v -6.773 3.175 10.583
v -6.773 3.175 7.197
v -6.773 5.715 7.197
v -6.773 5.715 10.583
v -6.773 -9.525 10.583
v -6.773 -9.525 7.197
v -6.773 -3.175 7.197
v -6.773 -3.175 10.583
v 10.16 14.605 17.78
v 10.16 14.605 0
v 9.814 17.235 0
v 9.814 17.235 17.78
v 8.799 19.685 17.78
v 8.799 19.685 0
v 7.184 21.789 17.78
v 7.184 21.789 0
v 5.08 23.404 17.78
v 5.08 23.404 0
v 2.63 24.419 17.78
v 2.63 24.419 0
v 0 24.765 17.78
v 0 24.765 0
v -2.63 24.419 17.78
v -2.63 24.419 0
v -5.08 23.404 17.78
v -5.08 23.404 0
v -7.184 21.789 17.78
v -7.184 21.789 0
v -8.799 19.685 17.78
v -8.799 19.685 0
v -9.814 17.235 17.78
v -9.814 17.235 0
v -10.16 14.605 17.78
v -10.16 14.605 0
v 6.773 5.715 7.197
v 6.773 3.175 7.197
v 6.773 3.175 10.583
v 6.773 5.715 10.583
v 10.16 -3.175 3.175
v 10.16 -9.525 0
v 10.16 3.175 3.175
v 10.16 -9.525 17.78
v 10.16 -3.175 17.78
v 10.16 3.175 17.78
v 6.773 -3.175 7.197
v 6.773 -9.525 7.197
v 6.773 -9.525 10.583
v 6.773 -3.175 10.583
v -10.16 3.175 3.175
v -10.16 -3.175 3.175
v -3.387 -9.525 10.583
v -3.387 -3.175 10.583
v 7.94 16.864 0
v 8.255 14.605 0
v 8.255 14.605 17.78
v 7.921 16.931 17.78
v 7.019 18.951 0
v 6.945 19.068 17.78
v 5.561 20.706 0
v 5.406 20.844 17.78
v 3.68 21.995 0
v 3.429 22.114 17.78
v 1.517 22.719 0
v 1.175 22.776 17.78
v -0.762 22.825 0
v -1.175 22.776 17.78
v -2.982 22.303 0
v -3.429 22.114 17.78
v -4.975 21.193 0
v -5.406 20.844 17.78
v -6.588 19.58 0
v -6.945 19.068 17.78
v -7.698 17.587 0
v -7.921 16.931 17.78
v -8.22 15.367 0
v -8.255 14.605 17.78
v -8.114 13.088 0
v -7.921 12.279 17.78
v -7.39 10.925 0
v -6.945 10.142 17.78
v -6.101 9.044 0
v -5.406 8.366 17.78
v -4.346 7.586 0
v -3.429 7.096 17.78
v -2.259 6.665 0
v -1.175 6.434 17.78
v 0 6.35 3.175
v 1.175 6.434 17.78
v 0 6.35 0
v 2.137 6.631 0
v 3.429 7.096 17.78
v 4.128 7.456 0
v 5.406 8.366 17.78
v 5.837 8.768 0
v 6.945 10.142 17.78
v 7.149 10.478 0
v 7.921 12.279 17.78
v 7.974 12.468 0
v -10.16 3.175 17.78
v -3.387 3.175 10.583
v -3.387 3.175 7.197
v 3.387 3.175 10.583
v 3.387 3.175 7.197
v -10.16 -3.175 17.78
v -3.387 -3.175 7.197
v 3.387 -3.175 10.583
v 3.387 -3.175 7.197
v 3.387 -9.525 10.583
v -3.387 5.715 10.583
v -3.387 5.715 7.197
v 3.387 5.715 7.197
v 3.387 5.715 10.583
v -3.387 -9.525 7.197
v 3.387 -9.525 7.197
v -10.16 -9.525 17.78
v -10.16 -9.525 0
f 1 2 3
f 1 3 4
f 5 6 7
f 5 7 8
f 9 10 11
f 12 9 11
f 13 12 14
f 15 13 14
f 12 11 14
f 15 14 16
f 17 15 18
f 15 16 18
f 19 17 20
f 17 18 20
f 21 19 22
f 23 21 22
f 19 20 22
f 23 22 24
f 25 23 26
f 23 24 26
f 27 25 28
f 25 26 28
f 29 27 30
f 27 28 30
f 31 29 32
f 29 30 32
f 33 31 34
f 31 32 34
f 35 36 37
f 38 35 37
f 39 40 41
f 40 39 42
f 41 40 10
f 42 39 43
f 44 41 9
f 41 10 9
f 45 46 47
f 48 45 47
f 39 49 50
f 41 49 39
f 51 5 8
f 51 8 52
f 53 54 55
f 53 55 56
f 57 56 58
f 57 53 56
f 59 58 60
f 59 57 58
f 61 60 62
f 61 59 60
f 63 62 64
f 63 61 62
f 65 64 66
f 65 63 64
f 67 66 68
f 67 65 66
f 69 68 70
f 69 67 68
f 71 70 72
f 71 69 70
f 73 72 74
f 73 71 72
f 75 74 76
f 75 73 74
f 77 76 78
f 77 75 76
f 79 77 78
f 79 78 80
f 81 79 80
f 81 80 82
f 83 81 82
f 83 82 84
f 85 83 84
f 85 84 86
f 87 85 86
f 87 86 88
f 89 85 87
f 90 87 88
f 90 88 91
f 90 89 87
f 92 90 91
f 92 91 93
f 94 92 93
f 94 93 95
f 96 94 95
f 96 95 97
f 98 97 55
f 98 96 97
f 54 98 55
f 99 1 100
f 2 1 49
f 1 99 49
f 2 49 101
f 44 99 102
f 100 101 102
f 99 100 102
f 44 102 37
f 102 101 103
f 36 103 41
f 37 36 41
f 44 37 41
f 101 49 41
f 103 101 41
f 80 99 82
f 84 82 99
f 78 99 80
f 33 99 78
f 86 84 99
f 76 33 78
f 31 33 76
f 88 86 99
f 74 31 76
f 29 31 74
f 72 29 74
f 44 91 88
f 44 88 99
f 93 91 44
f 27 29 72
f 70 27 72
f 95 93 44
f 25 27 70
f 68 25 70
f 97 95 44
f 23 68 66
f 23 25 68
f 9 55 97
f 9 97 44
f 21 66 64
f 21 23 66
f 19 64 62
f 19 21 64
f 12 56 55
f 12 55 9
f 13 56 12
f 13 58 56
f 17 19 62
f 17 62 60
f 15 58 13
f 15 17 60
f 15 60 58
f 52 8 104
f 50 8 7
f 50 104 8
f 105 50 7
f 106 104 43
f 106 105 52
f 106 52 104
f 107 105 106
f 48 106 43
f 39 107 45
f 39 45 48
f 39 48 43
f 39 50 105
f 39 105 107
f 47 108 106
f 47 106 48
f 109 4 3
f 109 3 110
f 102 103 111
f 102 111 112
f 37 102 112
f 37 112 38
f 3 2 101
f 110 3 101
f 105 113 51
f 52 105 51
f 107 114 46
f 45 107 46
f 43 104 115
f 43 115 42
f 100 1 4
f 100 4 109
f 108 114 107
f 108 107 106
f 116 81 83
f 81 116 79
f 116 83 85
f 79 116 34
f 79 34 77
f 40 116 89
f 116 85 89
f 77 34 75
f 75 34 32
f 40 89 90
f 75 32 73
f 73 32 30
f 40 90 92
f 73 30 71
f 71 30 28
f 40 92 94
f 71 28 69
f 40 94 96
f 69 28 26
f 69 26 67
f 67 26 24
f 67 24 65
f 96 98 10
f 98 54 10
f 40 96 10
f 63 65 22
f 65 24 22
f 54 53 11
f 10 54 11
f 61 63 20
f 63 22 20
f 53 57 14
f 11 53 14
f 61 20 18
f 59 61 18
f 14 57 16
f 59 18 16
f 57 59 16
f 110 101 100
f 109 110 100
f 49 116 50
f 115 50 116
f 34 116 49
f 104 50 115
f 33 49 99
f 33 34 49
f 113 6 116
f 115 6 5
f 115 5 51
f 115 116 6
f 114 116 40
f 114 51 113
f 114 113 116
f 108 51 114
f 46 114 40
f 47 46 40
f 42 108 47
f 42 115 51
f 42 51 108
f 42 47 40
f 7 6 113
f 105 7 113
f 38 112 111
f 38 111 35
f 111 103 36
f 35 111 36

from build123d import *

# Parameters (mm, degrees)
F0_W     = 20.32
F0_H     = 12.7
F1_DEPTH = 3.175
F2_W     = 20.32
F2_H     = 3.175
F3_DEPTH = 14.605
F4_R     = 8.255
F5_DEPTH = 17.78
F6_W     = 20.32
F6_H     = 17.78
F7_DEPTH = 3.175
F8_W     = 3.386666
F8_H     = 3.386666
F9_DEPTH = 15.24


with BuildPart() as f1:
    # F0 (on Top) → F1 (new body)
    with BuildSketch(Plane.XY):
        Rectangle(F0_W, F0_H)
    extrude(amount=F1_DEPTH)

    # F2 (on face) → F3 (join)
    with BuildSketch(Plane.XY.offset(3.175)):
        with Locations((0, -4.7625)):
            Rectangle(F2_W, F2_H)
    extrude(amount=F3_DEPTH)

    # F4 (on Top) → F5 (join)
    with BuildSketch(Plane.XY):
        with BuildLine():
            Line((10.16, 3.175), (10.16, 14.605))
            ThreePointArc((10.16, 14.605), (0, 24.765), (-10.16, 14.605))
            Line((-10.16, 14.605), (-10.16, 3.175))
            Line((-10.16, 3.175), (10.16, 3.175))
        make_face()
        with Locations((0, 14.605)):
            Circle(F4_R, mode=Mode.SUBTRACT)
    extrude(amount=F5_DEPTH)

    # F6 (on face) → F7 (join)
    with BuildSketch(Plane.XZ.offset(6.35)):
        with Locations((0, 8.89)):
            Rectangle(F6_W, F6_H)
    extrude(amount=F7_DEPTH)

    # F8 (on face) → F9 (cut)
    with BuildSketch(Plane.XZ.offset(9.525)):
        with Locations((-5.08, 8.89)):
            Rectangle(F8_W, F8_H)
        with Locations((5.08, 8.89)):
            Rectangle(F8_W, F8_H)
    extrude(amount=-F9_DEPTH, mode=Mode.SUBTRACT)


solid = f1.part
